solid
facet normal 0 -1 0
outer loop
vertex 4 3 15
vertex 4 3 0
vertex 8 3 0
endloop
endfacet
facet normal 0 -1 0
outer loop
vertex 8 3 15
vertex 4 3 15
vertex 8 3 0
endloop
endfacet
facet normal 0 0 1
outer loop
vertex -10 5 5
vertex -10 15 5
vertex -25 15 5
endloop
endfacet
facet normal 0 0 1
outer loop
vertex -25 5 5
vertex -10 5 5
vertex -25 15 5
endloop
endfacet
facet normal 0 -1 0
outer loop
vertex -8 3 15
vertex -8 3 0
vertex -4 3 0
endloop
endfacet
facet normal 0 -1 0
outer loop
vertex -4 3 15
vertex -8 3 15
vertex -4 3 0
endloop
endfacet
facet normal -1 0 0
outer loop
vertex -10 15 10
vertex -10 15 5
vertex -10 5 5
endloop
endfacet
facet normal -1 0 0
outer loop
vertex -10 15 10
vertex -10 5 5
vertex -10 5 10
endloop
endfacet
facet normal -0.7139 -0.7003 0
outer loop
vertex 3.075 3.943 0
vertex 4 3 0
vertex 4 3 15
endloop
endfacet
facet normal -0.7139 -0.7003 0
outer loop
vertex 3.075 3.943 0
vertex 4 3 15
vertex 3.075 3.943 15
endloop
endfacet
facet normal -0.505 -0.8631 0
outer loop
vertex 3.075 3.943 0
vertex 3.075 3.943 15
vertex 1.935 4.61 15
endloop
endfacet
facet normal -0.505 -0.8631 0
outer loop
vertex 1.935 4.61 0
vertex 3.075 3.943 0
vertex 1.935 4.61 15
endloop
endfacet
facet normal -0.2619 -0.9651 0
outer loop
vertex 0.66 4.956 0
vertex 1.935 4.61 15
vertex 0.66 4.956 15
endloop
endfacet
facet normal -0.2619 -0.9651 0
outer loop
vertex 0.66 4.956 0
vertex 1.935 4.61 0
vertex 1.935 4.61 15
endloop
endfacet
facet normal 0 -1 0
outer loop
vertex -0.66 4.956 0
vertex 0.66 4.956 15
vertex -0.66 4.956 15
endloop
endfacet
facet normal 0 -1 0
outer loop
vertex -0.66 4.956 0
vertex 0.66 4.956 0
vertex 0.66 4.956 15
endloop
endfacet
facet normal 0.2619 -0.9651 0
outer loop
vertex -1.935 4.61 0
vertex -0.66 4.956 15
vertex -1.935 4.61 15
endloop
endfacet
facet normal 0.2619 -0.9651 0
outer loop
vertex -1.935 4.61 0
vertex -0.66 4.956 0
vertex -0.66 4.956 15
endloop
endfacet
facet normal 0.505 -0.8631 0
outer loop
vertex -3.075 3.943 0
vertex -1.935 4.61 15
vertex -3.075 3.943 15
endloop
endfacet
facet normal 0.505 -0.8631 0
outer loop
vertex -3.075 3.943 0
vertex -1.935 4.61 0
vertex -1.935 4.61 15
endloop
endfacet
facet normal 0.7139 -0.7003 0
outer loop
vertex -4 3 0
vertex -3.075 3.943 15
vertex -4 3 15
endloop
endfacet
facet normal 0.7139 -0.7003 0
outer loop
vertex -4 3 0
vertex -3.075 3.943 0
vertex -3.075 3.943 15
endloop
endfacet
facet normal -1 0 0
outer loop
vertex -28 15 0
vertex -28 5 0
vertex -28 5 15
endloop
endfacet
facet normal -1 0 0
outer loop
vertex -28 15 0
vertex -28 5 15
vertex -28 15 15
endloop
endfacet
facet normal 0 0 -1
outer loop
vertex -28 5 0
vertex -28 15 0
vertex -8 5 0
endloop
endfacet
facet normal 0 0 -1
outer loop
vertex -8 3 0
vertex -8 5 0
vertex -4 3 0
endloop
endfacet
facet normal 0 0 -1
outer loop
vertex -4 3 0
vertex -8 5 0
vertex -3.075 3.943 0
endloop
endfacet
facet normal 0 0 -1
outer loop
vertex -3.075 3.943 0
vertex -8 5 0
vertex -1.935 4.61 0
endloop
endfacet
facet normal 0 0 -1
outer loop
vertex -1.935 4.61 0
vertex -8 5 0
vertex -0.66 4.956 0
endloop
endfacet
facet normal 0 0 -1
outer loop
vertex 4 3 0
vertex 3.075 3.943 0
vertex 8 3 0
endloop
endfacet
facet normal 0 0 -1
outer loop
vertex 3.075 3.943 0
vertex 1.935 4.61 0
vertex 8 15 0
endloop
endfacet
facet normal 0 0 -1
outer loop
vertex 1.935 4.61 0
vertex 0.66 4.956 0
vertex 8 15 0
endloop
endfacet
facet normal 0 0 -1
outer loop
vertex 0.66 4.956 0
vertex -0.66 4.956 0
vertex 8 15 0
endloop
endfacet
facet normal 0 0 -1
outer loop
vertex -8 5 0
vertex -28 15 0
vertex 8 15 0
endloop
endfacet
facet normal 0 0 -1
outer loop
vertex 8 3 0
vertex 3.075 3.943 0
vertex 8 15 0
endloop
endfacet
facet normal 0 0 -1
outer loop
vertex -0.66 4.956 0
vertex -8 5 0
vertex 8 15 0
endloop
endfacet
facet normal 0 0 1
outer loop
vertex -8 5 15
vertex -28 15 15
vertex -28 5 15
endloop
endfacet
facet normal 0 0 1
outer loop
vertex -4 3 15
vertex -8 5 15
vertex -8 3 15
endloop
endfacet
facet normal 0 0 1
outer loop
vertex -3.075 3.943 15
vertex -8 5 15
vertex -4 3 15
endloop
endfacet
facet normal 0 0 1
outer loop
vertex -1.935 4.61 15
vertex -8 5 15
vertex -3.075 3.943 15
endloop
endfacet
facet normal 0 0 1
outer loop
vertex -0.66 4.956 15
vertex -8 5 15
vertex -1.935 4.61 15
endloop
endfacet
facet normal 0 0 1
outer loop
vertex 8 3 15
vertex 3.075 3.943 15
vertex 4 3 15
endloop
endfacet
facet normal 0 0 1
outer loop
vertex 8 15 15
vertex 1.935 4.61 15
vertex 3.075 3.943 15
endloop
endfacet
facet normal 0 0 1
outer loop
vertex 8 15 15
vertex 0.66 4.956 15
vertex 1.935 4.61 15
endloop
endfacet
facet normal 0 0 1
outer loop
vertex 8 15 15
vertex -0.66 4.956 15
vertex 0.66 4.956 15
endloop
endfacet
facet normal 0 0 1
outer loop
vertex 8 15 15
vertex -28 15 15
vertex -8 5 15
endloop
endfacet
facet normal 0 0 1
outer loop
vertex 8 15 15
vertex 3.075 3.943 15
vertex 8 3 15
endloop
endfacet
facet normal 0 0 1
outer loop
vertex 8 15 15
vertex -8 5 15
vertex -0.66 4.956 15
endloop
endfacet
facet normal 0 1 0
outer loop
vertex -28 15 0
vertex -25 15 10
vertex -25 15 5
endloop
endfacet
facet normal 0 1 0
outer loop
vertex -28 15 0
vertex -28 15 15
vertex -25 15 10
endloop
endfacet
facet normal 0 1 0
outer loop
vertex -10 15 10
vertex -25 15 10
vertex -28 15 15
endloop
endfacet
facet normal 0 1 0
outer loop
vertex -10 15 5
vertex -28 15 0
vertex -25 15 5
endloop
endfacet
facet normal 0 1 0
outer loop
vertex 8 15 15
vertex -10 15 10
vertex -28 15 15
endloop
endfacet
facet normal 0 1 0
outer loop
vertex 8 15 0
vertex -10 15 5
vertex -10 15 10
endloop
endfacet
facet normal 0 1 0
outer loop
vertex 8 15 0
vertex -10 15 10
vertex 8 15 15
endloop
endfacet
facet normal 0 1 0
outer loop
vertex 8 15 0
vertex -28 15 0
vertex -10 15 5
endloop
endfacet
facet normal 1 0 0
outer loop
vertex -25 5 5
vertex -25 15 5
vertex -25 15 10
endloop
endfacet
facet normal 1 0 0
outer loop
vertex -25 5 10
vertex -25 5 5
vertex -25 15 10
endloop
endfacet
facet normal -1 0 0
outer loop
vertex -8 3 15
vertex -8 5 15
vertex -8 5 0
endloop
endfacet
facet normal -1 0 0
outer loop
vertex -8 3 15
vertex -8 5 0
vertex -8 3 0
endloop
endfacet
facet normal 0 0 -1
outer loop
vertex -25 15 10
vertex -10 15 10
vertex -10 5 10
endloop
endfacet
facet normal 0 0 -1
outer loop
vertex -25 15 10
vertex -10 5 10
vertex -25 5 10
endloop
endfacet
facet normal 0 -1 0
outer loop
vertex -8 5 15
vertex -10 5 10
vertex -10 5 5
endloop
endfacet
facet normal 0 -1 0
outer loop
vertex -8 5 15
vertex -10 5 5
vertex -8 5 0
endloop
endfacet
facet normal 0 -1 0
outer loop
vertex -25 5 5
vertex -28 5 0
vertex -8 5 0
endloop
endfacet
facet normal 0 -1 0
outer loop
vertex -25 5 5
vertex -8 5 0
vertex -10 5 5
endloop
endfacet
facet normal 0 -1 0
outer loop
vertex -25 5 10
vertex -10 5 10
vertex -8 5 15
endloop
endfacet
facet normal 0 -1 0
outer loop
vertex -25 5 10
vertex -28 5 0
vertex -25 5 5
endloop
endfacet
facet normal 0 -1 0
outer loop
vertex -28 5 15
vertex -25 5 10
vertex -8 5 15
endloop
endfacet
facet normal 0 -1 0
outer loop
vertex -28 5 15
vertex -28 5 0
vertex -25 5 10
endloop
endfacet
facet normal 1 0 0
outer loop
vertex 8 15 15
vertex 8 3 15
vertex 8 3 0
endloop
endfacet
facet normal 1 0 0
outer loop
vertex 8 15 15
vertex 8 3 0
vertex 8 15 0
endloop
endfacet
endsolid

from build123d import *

# Parameters (mm, degrees)
F0_W     = 56
F0_H     = 30
F0_R     = 5
F1_DEPTH = 15
F2_W     = 56
F2_H     = 15
F3_DEPTH = 18
F4_W     = 15
F4_H     = 5
F5_DEPTH = 25
F6_W     = 2
F6_H     = 15
F7_DEPTH = 20
F8_W     = 12
F8_H     = 15
F9_DEPTH = 20


with BuildPart() as f1:
    # F0 (on Top) → F1 (new body)
    with BuildSketch(Plane.XY):
        Rectangle(F0_W, F0_H)
        Circle(F0_R, mode=Mode.SUBTRACT)
    extrude(amount=F1_DEPTH)

    # F2 (on face) → F3 (cut)
    with BuildSketch(Plane.XZ.offset(15)):
        with Locations((0, 7.5)):
            Rectangle(F2_W, F2_H)
    extrude(amount=-F3_DEPTH, mode=Mode.SUBTRACT)

    # F4 (on face) → F5 (cut)
    with BuildSketch(Plane(origin=(0, 15, 0), x_dir=(-1, 0, 0), z_dir=(0, 1, 0))):
        with Locations((17.5, 7.5)):
            Rectangle(F4_W, F4_H)
    extrude(amount=-F5_DEPTH, mode=Mode.SUBTRACT)

    # F6 (on face) → F7 (cut)
    with BuildSketch(Plane(origin=(-28, 0, 0), x_dir=(0, -1, 0), z_dir=(-1, 0, 0))):
        with Locations((-4, 7.5)):
            Rectangle(F6_W, F6_H)
    extrude(amount=-F7_DEPTH, mode=Mode.SUBTRACT)

    # F8 (on face) → F9 (cut)
    with BuildSketch(Plane.YZ.offset(28)):
        with Locations((9, 7.5)):
            Rectangle(F8_W, F8_H)
    extrude(amount=-F9_DEPTH, mode=Mode.SUBTRACT)


solid = f1.part
